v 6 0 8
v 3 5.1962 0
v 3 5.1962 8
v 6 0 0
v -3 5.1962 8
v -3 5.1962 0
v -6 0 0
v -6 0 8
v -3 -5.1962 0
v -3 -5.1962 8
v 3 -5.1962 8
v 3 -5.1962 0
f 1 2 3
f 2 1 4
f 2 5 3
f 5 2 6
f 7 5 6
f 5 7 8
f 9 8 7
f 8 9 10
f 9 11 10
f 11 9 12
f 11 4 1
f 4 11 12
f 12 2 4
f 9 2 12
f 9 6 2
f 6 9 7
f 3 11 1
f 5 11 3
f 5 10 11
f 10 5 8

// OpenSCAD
feet_height = 8;
feet_diameter = 12;

cylinder(d = feet_diameter, h = feet_height, $fn = 6);
